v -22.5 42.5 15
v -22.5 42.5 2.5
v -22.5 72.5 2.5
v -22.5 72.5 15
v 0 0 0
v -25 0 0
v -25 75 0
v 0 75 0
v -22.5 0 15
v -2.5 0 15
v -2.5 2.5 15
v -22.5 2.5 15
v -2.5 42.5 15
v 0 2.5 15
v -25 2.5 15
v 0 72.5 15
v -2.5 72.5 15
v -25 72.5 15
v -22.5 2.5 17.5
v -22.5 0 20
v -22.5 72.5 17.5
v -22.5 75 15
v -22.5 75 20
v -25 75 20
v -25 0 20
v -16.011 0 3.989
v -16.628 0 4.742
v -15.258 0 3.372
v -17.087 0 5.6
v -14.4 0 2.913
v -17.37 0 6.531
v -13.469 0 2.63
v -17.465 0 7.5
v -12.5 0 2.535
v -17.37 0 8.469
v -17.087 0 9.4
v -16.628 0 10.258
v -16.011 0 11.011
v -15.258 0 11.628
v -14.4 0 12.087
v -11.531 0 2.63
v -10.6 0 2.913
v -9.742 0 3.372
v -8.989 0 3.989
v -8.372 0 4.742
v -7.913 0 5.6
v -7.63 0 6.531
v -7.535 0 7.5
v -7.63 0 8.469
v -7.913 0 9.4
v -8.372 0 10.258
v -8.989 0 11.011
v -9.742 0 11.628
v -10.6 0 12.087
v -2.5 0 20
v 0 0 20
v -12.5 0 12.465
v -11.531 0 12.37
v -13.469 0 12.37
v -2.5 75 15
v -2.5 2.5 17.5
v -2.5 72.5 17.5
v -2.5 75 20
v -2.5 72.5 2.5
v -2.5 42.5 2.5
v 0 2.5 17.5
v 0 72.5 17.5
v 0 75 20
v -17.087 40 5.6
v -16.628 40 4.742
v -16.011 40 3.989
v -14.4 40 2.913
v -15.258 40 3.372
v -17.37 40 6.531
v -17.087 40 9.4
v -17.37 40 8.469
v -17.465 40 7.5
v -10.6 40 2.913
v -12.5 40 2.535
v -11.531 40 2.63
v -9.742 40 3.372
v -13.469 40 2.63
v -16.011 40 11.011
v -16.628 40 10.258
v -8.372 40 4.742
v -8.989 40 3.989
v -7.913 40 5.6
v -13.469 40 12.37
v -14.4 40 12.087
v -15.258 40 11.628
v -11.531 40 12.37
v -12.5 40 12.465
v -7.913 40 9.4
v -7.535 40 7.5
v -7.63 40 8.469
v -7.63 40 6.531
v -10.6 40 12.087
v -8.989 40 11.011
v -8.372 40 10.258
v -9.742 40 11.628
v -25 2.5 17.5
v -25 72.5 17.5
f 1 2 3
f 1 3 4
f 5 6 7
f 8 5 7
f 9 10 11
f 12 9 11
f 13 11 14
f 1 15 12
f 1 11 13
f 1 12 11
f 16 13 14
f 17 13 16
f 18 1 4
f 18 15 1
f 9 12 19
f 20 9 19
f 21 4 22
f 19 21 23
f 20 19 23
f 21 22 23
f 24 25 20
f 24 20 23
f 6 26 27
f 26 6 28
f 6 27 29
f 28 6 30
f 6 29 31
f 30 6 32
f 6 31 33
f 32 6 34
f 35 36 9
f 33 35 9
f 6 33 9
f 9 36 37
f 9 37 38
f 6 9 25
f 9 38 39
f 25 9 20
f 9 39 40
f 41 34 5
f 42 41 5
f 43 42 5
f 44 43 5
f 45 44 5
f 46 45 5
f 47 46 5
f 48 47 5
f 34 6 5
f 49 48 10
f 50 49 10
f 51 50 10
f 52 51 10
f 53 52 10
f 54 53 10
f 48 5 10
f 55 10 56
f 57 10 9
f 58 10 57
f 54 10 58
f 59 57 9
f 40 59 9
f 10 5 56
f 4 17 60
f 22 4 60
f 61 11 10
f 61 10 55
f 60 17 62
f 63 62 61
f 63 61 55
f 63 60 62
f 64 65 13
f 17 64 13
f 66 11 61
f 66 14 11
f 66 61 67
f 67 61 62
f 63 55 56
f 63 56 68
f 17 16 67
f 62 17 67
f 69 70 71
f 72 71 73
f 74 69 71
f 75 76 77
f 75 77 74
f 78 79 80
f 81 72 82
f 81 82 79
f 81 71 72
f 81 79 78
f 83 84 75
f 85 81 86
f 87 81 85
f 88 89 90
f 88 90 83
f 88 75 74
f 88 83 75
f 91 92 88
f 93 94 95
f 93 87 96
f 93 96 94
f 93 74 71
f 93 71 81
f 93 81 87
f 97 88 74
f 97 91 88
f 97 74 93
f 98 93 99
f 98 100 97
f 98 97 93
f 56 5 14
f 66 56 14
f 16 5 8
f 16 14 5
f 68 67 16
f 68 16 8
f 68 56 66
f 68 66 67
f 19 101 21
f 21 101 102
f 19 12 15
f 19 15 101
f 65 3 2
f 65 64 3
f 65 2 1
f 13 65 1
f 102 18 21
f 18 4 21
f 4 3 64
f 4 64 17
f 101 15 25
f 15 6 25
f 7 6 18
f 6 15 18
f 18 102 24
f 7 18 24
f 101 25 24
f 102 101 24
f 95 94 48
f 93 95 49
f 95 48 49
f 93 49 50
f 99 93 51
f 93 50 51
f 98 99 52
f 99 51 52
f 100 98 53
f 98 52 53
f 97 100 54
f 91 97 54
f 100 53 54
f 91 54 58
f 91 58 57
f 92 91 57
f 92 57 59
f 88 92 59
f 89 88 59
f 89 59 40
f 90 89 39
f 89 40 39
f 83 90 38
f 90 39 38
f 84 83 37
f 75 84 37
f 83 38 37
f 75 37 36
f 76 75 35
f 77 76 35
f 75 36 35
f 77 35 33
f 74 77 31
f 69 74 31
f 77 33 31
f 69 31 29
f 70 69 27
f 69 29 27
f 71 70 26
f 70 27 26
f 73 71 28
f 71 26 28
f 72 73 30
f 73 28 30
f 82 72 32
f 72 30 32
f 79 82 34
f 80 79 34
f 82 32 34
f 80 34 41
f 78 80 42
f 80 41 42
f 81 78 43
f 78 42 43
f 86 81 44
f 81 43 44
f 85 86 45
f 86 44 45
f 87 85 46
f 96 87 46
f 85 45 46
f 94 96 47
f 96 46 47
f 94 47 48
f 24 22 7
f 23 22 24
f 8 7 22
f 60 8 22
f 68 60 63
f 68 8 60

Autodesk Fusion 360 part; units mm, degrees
sketch "Sketch2" plane through (0, 0, 0) normal (0, -1, 0) x (1, 0, 0)
  line L0 (-25, 15) -> (-25, 0)
  line L1 (-25, 0) -> (0, 0)
  line L2 (0, 0) -> (0, 15)
  line L3 (0, 15) -> (-25, 15)
  circle A0 centre (-12.5, 7.5) radius 4.965
  dimension "d7" = 9.93
box "BoxPrimitive2" add length 15 width 25 height 75 placed x (0, 0, 1) y (1, 0, 0) z (0, 1, 0) at (-25, 0, 0) makes body 1
extrude "Extrude1" cut sketch "Sketch2" against normal blind 40 contours A0 bodies 1
box "BoxPrimitive3" add length 30 width 20 height 12.5 placed x (0, -1, 0) y (1, 0, 0) z (0, 0, 1) at (-25, 75, 0) separate body makes body 2
move_body "Move1" bodies 2 to x (1, 0, 0) y (0, 1, 0) z (0, 0, 1) at (2.5, -2.5, 2.5)
combine "Combine1" operation cut target body 1 tool bodies 2
box "BoxPrimitive4" add length 2.5 width 2.5 height 20 placed x (0, 1, 0) y (-1, 0, 0) z (0, 0, 1) at (0, 0, 0) separate body makes body 3
copy_body "CopyPasteBodies1" bodies 3 makes body 4
move_body "Move2" bodies 4 to x (1, 0, 0) y (0, 1, 0) z (0, 0, 1) at (-22.5, 0, 0)
copy_body "CopyPasteBodies2" bodies 3 4 makes body 5 makes body 6
move_body "Move3" bodies 5 6 to x (1, 0, 0) y (0, 1, 0) z (0, 0, 1) at (0, 72.5, 0)
box "BoxPrimitive5" add length 75 width 2.5 height 2.5 placed x (0, 1, 0) y (-1, 0, 0) z (0, 0, 1) at (0, 0, 0) separate body makes body 7
move_body "Move4" bodies 7 to x (1, 0, 0) y (0, 1, 0) z (0, 0, 1) at (0, 0, 17.5)
copy_body "CopyPasteBodies3" bodies 7 makes body 8
move_body "Move5" bodies 8 to x (1, 0, 0) y (0, 1, 0) z (0, 0, 1) at (-22.5, 0, 0)
combine "Combine2" operation add target body 1 tool bodies 6 8 7 3 5 4
